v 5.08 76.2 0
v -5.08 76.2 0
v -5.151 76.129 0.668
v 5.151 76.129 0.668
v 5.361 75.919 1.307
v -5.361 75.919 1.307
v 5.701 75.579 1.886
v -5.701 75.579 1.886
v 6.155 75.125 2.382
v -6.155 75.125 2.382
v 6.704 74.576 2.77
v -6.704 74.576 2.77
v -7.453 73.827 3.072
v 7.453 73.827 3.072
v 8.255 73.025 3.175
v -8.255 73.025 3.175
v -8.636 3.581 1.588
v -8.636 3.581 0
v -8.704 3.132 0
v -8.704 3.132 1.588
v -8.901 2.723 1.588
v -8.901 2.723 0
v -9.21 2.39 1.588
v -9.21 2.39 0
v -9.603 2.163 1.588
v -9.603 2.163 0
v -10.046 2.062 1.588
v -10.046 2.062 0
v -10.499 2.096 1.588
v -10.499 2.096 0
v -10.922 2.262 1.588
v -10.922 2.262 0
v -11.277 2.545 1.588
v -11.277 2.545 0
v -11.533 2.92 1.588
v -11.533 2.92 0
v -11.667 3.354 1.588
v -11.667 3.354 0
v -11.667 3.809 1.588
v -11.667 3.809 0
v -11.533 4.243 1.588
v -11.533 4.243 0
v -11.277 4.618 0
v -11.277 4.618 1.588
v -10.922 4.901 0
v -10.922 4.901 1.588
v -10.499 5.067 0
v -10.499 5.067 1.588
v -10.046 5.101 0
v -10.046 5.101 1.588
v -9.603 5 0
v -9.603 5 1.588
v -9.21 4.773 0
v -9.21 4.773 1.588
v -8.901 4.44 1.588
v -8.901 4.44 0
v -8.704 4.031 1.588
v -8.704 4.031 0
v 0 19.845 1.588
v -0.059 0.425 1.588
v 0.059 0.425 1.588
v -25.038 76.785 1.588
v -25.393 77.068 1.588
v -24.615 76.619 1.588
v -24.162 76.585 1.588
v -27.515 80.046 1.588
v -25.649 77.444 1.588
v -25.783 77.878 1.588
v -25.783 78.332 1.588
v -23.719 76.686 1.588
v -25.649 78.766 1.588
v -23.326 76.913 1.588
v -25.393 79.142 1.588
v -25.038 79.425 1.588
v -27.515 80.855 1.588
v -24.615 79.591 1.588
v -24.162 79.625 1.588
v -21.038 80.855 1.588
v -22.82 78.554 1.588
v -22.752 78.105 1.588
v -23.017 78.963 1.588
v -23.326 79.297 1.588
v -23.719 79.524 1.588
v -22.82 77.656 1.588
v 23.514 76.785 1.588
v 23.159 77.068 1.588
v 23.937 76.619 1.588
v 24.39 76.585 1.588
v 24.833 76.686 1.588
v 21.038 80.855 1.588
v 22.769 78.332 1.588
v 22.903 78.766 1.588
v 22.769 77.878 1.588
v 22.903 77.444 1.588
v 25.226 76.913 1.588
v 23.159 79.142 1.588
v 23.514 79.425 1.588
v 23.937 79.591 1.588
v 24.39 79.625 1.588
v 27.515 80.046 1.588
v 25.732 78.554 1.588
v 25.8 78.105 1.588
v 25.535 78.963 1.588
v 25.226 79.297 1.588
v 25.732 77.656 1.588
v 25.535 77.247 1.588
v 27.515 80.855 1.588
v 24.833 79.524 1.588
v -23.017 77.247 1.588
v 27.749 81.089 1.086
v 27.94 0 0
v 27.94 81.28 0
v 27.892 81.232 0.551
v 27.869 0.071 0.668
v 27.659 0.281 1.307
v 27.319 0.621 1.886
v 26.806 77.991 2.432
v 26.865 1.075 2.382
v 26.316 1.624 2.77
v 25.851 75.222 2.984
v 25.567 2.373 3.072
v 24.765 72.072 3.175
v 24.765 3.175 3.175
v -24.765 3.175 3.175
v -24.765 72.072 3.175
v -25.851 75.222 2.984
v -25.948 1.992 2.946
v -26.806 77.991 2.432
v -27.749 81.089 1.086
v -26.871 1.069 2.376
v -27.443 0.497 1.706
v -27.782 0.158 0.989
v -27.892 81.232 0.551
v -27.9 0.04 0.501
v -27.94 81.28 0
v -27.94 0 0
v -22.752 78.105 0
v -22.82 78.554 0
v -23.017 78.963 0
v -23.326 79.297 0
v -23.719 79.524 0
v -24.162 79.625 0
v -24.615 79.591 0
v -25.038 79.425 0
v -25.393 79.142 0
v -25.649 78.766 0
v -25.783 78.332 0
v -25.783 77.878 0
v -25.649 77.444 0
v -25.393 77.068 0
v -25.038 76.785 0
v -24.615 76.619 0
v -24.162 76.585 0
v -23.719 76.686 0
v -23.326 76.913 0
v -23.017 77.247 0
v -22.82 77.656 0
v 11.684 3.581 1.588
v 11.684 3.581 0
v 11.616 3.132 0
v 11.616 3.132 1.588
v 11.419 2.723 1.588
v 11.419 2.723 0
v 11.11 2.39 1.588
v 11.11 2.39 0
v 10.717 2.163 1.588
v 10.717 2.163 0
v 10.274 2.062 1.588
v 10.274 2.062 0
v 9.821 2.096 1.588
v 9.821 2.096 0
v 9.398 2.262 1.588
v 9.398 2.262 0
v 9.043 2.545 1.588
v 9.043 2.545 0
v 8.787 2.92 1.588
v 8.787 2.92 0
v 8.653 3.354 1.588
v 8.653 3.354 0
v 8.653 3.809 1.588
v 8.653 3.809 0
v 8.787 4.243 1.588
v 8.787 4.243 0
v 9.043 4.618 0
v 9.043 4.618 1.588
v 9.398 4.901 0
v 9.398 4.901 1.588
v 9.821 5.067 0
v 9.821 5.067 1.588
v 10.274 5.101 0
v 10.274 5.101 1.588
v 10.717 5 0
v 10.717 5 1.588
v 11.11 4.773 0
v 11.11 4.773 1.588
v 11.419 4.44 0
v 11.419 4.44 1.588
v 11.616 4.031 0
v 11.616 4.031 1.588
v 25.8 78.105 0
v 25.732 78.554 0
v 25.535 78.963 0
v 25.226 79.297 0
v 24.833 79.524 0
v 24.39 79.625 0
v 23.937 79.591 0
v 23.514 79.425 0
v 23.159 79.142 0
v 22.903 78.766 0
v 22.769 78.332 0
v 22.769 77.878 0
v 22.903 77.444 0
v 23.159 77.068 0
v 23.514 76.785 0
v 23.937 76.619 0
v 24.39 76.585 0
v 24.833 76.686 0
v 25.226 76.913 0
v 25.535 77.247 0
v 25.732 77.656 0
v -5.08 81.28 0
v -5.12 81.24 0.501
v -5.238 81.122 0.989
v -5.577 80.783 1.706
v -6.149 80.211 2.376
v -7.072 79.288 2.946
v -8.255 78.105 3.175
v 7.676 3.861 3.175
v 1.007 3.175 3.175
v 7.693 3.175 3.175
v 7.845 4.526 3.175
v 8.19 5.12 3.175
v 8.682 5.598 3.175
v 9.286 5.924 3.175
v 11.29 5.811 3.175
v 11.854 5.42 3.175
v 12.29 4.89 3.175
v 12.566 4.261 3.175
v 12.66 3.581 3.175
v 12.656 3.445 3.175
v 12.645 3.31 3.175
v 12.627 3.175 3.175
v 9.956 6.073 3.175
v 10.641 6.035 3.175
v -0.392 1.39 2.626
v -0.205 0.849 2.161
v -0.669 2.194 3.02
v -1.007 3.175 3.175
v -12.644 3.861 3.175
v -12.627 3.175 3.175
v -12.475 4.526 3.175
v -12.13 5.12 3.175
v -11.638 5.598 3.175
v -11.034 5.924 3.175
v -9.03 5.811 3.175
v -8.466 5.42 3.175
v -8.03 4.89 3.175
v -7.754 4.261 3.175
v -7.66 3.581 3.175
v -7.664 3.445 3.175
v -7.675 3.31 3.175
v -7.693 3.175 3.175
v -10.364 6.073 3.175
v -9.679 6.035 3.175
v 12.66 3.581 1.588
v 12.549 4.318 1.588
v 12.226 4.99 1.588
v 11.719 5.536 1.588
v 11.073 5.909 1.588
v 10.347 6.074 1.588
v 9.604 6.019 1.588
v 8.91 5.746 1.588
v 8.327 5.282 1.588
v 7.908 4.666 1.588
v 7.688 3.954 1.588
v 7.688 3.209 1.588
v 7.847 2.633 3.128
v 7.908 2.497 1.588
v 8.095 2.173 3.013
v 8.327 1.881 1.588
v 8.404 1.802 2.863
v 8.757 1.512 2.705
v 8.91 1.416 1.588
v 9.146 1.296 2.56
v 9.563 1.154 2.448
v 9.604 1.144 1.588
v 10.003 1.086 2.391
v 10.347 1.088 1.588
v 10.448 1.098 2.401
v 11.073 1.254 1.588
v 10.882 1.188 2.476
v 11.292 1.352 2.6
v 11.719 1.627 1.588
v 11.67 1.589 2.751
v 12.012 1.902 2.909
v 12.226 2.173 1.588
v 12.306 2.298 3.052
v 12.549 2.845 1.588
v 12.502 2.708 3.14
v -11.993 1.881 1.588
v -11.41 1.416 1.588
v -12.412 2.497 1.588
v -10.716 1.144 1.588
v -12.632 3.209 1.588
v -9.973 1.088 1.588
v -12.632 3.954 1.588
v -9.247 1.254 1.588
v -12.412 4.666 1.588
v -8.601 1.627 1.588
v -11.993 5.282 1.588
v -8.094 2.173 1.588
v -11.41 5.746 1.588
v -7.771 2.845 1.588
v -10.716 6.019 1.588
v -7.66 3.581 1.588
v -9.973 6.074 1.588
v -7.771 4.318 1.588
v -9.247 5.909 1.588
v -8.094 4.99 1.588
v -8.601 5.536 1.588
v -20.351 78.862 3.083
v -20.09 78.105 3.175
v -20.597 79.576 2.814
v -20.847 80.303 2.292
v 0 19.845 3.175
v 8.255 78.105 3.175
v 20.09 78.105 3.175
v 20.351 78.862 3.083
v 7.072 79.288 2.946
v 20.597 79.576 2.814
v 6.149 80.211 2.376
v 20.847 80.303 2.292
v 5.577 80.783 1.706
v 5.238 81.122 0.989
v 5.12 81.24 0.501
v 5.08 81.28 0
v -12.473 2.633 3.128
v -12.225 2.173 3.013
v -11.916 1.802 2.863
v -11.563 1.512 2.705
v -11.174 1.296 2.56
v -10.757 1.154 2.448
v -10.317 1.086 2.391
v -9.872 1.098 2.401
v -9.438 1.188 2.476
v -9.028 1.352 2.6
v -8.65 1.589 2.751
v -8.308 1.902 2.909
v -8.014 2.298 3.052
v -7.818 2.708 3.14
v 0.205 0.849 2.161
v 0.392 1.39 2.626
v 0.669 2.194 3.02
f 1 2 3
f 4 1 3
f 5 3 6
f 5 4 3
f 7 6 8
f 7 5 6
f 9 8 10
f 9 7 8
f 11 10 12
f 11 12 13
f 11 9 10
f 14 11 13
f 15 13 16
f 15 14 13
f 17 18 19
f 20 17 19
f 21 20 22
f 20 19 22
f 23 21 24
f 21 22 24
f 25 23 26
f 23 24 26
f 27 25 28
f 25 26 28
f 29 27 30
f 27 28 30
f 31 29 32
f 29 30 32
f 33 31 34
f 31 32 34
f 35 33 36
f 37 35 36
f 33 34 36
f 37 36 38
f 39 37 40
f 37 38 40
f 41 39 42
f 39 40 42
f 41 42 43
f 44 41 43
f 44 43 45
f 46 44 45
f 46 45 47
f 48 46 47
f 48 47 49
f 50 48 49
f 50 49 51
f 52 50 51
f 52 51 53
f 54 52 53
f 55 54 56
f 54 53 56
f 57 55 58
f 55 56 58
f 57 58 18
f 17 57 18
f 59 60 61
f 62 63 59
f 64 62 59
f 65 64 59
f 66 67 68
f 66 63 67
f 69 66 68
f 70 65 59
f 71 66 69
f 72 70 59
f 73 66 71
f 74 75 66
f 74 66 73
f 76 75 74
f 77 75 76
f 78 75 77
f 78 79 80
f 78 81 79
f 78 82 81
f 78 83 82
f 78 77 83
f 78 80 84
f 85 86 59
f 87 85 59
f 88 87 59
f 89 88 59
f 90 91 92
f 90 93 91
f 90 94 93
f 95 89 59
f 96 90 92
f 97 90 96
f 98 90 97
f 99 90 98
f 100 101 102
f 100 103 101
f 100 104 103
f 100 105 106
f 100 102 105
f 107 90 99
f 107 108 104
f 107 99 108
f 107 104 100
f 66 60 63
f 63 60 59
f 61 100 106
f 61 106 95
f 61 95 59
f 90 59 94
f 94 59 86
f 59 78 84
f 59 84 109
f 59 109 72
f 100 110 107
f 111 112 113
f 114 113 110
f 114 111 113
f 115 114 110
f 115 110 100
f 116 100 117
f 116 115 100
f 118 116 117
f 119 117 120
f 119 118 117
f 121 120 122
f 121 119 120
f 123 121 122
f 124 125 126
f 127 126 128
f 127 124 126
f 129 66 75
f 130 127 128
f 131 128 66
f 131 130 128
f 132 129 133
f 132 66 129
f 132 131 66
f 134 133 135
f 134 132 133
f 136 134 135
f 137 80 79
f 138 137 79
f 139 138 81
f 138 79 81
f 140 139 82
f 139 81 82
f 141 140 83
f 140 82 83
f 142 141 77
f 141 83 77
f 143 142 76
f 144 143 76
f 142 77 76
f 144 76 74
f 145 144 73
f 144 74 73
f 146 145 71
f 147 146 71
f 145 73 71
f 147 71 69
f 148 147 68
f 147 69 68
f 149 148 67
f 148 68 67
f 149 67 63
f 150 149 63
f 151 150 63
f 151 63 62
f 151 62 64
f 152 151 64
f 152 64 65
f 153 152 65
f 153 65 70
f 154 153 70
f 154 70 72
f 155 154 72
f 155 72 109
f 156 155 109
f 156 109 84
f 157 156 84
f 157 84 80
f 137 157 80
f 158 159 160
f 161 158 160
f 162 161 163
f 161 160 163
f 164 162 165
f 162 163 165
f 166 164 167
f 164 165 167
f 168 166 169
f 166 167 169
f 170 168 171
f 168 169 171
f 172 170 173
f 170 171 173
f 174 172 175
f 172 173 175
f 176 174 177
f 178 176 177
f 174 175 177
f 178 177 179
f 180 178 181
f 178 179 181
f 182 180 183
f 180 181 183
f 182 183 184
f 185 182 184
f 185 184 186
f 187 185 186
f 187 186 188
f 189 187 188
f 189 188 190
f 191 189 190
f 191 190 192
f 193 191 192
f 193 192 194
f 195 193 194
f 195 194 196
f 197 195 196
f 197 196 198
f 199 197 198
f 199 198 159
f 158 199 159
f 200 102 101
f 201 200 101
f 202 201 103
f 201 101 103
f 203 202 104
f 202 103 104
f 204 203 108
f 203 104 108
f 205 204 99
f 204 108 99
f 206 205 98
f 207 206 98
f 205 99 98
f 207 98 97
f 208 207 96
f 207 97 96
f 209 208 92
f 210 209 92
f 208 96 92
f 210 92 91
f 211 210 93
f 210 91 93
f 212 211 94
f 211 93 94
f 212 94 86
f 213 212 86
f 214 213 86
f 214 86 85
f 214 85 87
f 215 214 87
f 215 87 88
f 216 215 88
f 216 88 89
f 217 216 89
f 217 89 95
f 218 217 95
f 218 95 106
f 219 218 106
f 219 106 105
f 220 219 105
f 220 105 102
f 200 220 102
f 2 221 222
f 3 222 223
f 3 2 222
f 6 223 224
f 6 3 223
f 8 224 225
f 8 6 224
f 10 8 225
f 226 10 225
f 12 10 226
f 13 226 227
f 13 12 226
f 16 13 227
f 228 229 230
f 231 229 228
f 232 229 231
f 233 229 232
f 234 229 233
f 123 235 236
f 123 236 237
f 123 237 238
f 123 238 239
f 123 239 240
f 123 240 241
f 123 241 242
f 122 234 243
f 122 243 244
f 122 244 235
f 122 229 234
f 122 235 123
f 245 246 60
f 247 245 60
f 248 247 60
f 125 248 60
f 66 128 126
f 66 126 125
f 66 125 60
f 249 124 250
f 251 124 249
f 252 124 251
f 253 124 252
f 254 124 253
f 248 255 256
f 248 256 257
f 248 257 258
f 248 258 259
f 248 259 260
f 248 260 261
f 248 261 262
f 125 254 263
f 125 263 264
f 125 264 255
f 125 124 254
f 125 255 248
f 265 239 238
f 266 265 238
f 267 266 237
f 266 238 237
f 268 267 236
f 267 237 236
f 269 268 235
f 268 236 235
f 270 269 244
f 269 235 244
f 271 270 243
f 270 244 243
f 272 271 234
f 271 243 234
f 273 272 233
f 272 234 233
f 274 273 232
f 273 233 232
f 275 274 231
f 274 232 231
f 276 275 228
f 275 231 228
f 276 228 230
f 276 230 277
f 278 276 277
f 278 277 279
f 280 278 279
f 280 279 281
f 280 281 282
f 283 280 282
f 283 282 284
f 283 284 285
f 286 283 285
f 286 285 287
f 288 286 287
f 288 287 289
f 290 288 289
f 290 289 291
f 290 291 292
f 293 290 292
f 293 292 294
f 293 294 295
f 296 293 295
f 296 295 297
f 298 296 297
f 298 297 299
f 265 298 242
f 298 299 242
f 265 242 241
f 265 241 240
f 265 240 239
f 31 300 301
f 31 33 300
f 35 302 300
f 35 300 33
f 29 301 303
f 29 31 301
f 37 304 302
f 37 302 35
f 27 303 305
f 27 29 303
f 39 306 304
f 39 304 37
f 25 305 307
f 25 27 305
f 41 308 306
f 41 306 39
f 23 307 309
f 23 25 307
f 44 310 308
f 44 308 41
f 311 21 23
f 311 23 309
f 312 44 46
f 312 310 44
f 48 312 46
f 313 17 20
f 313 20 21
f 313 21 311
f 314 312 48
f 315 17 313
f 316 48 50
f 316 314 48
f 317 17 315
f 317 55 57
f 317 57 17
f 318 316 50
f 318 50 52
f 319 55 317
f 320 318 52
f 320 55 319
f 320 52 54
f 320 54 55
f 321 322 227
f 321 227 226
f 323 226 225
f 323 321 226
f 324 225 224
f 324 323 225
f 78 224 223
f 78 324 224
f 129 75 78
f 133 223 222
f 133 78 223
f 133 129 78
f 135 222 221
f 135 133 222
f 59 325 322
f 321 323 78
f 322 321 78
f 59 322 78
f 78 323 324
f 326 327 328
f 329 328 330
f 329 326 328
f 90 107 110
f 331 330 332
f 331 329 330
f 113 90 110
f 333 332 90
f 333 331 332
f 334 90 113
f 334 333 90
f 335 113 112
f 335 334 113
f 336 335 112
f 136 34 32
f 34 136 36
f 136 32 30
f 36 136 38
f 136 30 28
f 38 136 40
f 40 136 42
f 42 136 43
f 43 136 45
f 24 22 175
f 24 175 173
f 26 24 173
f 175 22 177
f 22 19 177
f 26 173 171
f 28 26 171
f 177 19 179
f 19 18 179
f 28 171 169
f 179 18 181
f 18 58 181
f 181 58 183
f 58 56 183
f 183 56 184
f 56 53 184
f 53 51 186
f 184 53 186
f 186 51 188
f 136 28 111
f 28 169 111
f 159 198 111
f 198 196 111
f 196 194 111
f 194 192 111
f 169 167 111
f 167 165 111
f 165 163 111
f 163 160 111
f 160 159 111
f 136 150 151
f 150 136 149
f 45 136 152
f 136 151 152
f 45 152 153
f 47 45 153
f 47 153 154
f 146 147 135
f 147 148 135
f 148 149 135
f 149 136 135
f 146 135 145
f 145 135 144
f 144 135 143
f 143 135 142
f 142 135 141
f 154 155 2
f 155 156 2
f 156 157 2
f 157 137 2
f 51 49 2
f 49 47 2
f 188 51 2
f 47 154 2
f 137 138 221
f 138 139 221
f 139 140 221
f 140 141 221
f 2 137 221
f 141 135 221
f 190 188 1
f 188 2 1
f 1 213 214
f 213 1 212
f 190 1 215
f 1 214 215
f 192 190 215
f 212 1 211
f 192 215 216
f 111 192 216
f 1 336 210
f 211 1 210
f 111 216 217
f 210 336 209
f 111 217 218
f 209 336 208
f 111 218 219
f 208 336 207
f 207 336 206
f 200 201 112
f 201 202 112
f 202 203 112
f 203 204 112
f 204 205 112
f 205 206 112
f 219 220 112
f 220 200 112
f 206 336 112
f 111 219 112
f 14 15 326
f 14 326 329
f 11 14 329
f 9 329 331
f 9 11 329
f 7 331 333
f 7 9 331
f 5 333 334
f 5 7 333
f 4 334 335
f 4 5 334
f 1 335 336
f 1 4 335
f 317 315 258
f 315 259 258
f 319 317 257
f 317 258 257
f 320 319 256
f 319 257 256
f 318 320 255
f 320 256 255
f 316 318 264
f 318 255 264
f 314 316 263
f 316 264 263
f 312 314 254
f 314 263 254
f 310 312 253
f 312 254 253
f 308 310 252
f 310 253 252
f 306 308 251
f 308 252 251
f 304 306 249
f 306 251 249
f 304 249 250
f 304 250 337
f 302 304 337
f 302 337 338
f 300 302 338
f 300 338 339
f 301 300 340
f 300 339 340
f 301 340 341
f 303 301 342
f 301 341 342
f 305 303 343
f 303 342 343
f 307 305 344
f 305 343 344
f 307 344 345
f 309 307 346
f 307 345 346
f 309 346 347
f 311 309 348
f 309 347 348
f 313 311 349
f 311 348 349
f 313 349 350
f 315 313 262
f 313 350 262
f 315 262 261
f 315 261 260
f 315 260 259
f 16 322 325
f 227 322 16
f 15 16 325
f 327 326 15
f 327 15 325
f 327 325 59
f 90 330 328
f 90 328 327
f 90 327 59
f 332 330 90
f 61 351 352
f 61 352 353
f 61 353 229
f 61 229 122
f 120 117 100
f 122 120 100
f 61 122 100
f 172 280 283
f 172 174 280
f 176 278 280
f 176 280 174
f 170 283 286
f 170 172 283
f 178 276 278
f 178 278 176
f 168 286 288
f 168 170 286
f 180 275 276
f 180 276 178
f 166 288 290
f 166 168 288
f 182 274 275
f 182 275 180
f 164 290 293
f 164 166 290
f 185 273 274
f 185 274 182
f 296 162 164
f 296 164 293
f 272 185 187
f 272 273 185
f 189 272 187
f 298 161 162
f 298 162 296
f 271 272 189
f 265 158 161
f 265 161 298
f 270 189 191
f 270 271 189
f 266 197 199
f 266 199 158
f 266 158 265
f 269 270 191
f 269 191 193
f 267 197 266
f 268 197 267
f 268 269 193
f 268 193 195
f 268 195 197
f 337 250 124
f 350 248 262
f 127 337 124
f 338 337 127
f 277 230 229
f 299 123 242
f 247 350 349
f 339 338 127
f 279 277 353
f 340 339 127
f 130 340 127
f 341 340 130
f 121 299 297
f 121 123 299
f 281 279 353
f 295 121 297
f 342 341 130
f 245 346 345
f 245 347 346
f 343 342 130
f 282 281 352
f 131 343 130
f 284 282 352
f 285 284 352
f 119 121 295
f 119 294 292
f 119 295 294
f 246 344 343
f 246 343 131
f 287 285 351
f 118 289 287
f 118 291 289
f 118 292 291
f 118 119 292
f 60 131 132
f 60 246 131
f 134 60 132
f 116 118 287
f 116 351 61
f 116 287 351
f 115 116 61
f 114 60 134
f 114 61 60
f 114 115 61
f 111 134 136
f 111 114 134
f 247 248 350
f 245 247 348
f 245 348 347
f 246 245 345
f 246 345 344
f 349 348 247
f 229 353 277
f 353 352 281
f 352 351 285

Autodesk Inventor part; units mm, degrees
ref_plane "YZ Plane" through (0, 0, 0) normal (1, 0, 0) x (0, 1, 0)
ref_plane "XZ Plane" through (0, 0, 0) normal (0, 1, 0) x (-1, 0, 0)
ref_plane "XY Plane" through (0, 0, 0) normal (0, 0, 1) x (1, 0, 0)
sketch "Sketch1" plane through (0, 0, 0) normal (0, 0, 1) x (1, 0, 0)
  line L0 (-27.94, 0) -> (27.94, 0)
  line L1 (-27.94, 0) -> (-27.94, 76.2)
  line L2 (-27.94, 76.2) -> (-27.94, 81.28)
  line L3 (-27.94, 81.28) -> (27.94, 81.28)
  line L4 (27.94, 81.28) -> (27.94, 0)
  line L5 (-27.94, 76.2) -> (27.94, 76.2)
  line L6 (0, 0) -> (0, 3.5814)
  line L7 (0, 3.5814) -> (-10.16, 3.5814)
  line L8 (-10.16, 3.5814) -> (10.16, 3.5814)
  circle A0 centre (-10.16, 3.5814) radius 1.524
  circle A1 centre (10.16, 3.5814) radius 1.524
  line L9 (0, 76.2) -> (0, 81.28)
  line L10 (0, 76.2) -> (-5.08, 76.2)
  line L11 (-5.08, 76.2) -> (-5.08, 81.28)
  line L12 (0, 76.2) -> (5.08, 76.2)
  line L13 (5.08, 76.2) -> (5.08, 81.28)
  dimension "d0" = 55.88
  dimension "d1" = 76.2
  dimension "d2" = 5.08
  dimension "d3" = 3.5814
  dimension "d4" = 10.16
  dimension "d5" = 20.32
  dimension "d6" = 3.048
  dimension "d7" = 3.048
  dimension "d8" = 5.08
extrude "Extrusion1" add sketch "Sketch1" along normal blind 3.175 contours L1 L5 L4 L0 | L2 L3 L11 L5 | L5 L13 L3 L4
sketch "Sketch2" plane through (0, 0, 3.175) normal (0, 0, 1) x (1, 0, 0)
  line L0 (-27.94, 81.28) -> (-27.94, 0) projected
  line L1 (3.4628, 9.8032) -> (-34.29, 119.2864)
  line L2 (-34.29, 119.2864) -> (-34.29, 0)
  line L3 (0, 0) -> (0, 76.2)
  line L4 (5.08, 76.2) -> (-5.08, 76.2) projected
  line L5 (-3.4628, 9.8032) -> (34.29, 119.2864)
  line L6 (27.94, 0) -> (27.94, 81.28) projected
  line L7 (27.94, 81.28) -> (5.08, 81.28) projected
  line L8 (5.08, 81.28) -> (5.08, 76.2) projected
  line L9 (5.08, 76.2) -> (-5.08, 76.2) projected
  line L10 (-5.08, 76.2) -> (-5.08, 81.28) projected
  line L11 (-5.08, 81.28) -> (-27.94, 81.28) projected
  line L12 (-27.94, 81.28) -> (-27.94, 0) projected
  line L13 (-27.94, 0) -> (27.94, 0) projected
  circle A0 centre (-10.16, 3.5814) radius 1.524 projected
  circle A1 centre (10.16, 3.5814) radius 1.524 projected
  line L14 (0, 0) -> (0, 0.254)
  line L15 (-5.08, 81.28) -> (-27.94, 81.28) projected
  line L16 (0, 0.254) -> (-27.94, 81.28)
  line L17 (0, 0.254) -> (27.94, 81.28)
  point P0 (6.0051, 2.0643)
  point P1 (-6.0051, 2.0643)
  point P2 (21.1843, 81.28)
  point P3 (0, 19.8454)
  point P4 (-21.1843, 81.28)
  dimension "d15" = 0.254
extrude "Extrusion2" cut sketch "Sketch2" against normal blind 1.5875 contours L11 L1 L5 L16 | L5 L3 L16 | L5 L7 L17 L1 | L1 L17 L3 | A0 | A1
fillet "Fillet1" radius 3.175 8 edges at (-13.1322, 81.28, 3.175) (13.1322, 81.28, 3.175) (27.94, 40.64, 3.175) (-27.94, 40.64, 3.175) (-5.08, 78.74, 3.175) (0, 76.2, 3.175) (5.08, 78.74, 3.175) (0, 0, 3.175)
sketch "Sketch3" plane through (0, 0, 1.5875) normal (0, 0, 1) x (1, 0, 0)
  line L0 (0.0591, 0.4254) -> (-0.0591, 0.4254) projected
  line L1 (27.5146, 80.0464) -> (0.0591, 0.4254) projected
  line L2 (27.5146, 80.8546) -> (27.5146, 80.0464) projected
  line L3 (21.0377, 80.8546) -> (27.5146, 80.8546) projected
  line L4 (0, 19.8454) -> (21.0377, 80.8546) projected
  line L5 (-21.0377, 80.8546) -> (0, 19.8454) projected
  line L6 (-27.5146, 80.8546) -> (-21.0377, 80.8546) projected
  line L7 (-27.5146, 80.0464) -> (-27.5146, 80.8546) projected
  line L8 (-0.0591, 0.4254) -> (-27.5146, 80.0464) projected
  circle A0 centre (-24.2761, 78.105) radius 1.524
  line L9 (-27.5146, 80.8546) -> (-27.94, 81.28) projected
  line L10 (-27.5146, 80.8546) -> (-21.0377, 80.8546) projected
  line L11 (-21.0377, 80.8546) -> (-20.0895, 78.105) projected
  line L12 (-20.0895, 78.105) -> (-8.255, 78.105) projected
  line L13 (-8.255, 78.105) -> (-5.08, 81.28) projected
  line L14 (-5.08, 81.28) -> (-27.94, 81.28) projected
  line L15 (-27.94, 81.28) -> (-27.94, 0) projected
  line L16 (5.08, 76.2) -> (-5.08, 76.2) projected
  line L17 (0, 76.2) -> (0, 83.5529)
  circle A1 centre (24.2761, 78.105) radius 1.524
  line L18 (-1.0072, 3.175) -> (-8.6912, 3.175) projected
  line L19 (-1.0072, 3.175) -> (-24.765, 72.0725) projected
  line L20 (-24.765, 3.175) -> (-24.765, 72.0725) projected
  line L21 (-11.6288, 3.175) -> (-24.765, 3.175) projected
  arc A2 (-8.6912, 3.175) -> (-11.6288, 3.175) centre (-10.16, 3.5814) ccw projected
  line L22 (8.6912, 3.175) -> (1.0072, 3.175) projected
  arc A3 (11.6288, 3.175) -> (8.6912, 3.175) centre (10.16, 3.5814) ccw projected
  line L23 (24.765, 3.175) -> (11.6288, 3.175) projected
  line L24 (24.765, 72.0725) -> (24.765, 3.175) projected
  line L25 (24.765, 72.0725) -> (1.0072, 3.175) projected
  point P0 (0, 0)
  point P1 (-24.2761, 80.8546)
  dimension "d16" = 3.048
  dimension "d17" = 3.175
  dimension "d21" = 74.5236
  dimension "d22" = 14.1161
extrude "Extrusion3" cut sketch "Sketch3" against normal blind 25.4 contours A0 | A1
sketch "Sketch4" plane through (0, 0, 3.175) normal (0, 0, 1) x (1, 0, 0)
  line L0 (-1.0072, 3.175) -> (-8.6912, 3.175) projected
  line L1 (-1.0072, 3.175) -> (-24.765, 72.0725) projected
  line L2 (-24.765, 3.175) -> (-24.765, 72.0725) projected
  line L3 (-11.6288, 3.175) -> (-24.765, 3.175) projected
  arc A0 (-8.6912, 3.175) -> (-11.6288, 3.175) centre (-10.16, 3.5814) ccw projected
  line L4 (8.6912, 3.175) -> (1.0072, 3.175) projected
  arc A1 (11.6288, 3.175) -> (8.6912, 3.175) centre (10.16, 3.5814) ccw projected
  line L5 (24.765, 3.175) -> (11.6288, 3.175) projected
  line L6 (24.765, 72.0725) -> (24.765, 3.175) projected
  line L7 (24.765, 72.0725) -> (1.0072, 3.175) projected
  circle A2 centre (-10.16, 3.5814) radius 1.524 projected
  circle A3 centre (-10.16, 3.5814) radius 2.5
  arc A4 (11.6288, 3.175) -> (8.6912, 3.175) centre (10.16, 3.5814) ccw projected
  circle A5 centre (10.16, 3.5814) radius 2.5
  point P0 (0, 0)
  point P1 (12.6267, 3.175)
  point P2 (7.6933, 3.175)
  dimension "d23" = 5
  dimension "d24" = 5
extrude "Extrusion4" cut sketch "Sketch4" against normal blind 1.5875 contours A3 L3 A2 L0 | L0 A0 L3 A3 | A2 A0 | A1 L5 A5 L4 | L4 A5 L5 A1
properties part number "holo - laser battery backing"
